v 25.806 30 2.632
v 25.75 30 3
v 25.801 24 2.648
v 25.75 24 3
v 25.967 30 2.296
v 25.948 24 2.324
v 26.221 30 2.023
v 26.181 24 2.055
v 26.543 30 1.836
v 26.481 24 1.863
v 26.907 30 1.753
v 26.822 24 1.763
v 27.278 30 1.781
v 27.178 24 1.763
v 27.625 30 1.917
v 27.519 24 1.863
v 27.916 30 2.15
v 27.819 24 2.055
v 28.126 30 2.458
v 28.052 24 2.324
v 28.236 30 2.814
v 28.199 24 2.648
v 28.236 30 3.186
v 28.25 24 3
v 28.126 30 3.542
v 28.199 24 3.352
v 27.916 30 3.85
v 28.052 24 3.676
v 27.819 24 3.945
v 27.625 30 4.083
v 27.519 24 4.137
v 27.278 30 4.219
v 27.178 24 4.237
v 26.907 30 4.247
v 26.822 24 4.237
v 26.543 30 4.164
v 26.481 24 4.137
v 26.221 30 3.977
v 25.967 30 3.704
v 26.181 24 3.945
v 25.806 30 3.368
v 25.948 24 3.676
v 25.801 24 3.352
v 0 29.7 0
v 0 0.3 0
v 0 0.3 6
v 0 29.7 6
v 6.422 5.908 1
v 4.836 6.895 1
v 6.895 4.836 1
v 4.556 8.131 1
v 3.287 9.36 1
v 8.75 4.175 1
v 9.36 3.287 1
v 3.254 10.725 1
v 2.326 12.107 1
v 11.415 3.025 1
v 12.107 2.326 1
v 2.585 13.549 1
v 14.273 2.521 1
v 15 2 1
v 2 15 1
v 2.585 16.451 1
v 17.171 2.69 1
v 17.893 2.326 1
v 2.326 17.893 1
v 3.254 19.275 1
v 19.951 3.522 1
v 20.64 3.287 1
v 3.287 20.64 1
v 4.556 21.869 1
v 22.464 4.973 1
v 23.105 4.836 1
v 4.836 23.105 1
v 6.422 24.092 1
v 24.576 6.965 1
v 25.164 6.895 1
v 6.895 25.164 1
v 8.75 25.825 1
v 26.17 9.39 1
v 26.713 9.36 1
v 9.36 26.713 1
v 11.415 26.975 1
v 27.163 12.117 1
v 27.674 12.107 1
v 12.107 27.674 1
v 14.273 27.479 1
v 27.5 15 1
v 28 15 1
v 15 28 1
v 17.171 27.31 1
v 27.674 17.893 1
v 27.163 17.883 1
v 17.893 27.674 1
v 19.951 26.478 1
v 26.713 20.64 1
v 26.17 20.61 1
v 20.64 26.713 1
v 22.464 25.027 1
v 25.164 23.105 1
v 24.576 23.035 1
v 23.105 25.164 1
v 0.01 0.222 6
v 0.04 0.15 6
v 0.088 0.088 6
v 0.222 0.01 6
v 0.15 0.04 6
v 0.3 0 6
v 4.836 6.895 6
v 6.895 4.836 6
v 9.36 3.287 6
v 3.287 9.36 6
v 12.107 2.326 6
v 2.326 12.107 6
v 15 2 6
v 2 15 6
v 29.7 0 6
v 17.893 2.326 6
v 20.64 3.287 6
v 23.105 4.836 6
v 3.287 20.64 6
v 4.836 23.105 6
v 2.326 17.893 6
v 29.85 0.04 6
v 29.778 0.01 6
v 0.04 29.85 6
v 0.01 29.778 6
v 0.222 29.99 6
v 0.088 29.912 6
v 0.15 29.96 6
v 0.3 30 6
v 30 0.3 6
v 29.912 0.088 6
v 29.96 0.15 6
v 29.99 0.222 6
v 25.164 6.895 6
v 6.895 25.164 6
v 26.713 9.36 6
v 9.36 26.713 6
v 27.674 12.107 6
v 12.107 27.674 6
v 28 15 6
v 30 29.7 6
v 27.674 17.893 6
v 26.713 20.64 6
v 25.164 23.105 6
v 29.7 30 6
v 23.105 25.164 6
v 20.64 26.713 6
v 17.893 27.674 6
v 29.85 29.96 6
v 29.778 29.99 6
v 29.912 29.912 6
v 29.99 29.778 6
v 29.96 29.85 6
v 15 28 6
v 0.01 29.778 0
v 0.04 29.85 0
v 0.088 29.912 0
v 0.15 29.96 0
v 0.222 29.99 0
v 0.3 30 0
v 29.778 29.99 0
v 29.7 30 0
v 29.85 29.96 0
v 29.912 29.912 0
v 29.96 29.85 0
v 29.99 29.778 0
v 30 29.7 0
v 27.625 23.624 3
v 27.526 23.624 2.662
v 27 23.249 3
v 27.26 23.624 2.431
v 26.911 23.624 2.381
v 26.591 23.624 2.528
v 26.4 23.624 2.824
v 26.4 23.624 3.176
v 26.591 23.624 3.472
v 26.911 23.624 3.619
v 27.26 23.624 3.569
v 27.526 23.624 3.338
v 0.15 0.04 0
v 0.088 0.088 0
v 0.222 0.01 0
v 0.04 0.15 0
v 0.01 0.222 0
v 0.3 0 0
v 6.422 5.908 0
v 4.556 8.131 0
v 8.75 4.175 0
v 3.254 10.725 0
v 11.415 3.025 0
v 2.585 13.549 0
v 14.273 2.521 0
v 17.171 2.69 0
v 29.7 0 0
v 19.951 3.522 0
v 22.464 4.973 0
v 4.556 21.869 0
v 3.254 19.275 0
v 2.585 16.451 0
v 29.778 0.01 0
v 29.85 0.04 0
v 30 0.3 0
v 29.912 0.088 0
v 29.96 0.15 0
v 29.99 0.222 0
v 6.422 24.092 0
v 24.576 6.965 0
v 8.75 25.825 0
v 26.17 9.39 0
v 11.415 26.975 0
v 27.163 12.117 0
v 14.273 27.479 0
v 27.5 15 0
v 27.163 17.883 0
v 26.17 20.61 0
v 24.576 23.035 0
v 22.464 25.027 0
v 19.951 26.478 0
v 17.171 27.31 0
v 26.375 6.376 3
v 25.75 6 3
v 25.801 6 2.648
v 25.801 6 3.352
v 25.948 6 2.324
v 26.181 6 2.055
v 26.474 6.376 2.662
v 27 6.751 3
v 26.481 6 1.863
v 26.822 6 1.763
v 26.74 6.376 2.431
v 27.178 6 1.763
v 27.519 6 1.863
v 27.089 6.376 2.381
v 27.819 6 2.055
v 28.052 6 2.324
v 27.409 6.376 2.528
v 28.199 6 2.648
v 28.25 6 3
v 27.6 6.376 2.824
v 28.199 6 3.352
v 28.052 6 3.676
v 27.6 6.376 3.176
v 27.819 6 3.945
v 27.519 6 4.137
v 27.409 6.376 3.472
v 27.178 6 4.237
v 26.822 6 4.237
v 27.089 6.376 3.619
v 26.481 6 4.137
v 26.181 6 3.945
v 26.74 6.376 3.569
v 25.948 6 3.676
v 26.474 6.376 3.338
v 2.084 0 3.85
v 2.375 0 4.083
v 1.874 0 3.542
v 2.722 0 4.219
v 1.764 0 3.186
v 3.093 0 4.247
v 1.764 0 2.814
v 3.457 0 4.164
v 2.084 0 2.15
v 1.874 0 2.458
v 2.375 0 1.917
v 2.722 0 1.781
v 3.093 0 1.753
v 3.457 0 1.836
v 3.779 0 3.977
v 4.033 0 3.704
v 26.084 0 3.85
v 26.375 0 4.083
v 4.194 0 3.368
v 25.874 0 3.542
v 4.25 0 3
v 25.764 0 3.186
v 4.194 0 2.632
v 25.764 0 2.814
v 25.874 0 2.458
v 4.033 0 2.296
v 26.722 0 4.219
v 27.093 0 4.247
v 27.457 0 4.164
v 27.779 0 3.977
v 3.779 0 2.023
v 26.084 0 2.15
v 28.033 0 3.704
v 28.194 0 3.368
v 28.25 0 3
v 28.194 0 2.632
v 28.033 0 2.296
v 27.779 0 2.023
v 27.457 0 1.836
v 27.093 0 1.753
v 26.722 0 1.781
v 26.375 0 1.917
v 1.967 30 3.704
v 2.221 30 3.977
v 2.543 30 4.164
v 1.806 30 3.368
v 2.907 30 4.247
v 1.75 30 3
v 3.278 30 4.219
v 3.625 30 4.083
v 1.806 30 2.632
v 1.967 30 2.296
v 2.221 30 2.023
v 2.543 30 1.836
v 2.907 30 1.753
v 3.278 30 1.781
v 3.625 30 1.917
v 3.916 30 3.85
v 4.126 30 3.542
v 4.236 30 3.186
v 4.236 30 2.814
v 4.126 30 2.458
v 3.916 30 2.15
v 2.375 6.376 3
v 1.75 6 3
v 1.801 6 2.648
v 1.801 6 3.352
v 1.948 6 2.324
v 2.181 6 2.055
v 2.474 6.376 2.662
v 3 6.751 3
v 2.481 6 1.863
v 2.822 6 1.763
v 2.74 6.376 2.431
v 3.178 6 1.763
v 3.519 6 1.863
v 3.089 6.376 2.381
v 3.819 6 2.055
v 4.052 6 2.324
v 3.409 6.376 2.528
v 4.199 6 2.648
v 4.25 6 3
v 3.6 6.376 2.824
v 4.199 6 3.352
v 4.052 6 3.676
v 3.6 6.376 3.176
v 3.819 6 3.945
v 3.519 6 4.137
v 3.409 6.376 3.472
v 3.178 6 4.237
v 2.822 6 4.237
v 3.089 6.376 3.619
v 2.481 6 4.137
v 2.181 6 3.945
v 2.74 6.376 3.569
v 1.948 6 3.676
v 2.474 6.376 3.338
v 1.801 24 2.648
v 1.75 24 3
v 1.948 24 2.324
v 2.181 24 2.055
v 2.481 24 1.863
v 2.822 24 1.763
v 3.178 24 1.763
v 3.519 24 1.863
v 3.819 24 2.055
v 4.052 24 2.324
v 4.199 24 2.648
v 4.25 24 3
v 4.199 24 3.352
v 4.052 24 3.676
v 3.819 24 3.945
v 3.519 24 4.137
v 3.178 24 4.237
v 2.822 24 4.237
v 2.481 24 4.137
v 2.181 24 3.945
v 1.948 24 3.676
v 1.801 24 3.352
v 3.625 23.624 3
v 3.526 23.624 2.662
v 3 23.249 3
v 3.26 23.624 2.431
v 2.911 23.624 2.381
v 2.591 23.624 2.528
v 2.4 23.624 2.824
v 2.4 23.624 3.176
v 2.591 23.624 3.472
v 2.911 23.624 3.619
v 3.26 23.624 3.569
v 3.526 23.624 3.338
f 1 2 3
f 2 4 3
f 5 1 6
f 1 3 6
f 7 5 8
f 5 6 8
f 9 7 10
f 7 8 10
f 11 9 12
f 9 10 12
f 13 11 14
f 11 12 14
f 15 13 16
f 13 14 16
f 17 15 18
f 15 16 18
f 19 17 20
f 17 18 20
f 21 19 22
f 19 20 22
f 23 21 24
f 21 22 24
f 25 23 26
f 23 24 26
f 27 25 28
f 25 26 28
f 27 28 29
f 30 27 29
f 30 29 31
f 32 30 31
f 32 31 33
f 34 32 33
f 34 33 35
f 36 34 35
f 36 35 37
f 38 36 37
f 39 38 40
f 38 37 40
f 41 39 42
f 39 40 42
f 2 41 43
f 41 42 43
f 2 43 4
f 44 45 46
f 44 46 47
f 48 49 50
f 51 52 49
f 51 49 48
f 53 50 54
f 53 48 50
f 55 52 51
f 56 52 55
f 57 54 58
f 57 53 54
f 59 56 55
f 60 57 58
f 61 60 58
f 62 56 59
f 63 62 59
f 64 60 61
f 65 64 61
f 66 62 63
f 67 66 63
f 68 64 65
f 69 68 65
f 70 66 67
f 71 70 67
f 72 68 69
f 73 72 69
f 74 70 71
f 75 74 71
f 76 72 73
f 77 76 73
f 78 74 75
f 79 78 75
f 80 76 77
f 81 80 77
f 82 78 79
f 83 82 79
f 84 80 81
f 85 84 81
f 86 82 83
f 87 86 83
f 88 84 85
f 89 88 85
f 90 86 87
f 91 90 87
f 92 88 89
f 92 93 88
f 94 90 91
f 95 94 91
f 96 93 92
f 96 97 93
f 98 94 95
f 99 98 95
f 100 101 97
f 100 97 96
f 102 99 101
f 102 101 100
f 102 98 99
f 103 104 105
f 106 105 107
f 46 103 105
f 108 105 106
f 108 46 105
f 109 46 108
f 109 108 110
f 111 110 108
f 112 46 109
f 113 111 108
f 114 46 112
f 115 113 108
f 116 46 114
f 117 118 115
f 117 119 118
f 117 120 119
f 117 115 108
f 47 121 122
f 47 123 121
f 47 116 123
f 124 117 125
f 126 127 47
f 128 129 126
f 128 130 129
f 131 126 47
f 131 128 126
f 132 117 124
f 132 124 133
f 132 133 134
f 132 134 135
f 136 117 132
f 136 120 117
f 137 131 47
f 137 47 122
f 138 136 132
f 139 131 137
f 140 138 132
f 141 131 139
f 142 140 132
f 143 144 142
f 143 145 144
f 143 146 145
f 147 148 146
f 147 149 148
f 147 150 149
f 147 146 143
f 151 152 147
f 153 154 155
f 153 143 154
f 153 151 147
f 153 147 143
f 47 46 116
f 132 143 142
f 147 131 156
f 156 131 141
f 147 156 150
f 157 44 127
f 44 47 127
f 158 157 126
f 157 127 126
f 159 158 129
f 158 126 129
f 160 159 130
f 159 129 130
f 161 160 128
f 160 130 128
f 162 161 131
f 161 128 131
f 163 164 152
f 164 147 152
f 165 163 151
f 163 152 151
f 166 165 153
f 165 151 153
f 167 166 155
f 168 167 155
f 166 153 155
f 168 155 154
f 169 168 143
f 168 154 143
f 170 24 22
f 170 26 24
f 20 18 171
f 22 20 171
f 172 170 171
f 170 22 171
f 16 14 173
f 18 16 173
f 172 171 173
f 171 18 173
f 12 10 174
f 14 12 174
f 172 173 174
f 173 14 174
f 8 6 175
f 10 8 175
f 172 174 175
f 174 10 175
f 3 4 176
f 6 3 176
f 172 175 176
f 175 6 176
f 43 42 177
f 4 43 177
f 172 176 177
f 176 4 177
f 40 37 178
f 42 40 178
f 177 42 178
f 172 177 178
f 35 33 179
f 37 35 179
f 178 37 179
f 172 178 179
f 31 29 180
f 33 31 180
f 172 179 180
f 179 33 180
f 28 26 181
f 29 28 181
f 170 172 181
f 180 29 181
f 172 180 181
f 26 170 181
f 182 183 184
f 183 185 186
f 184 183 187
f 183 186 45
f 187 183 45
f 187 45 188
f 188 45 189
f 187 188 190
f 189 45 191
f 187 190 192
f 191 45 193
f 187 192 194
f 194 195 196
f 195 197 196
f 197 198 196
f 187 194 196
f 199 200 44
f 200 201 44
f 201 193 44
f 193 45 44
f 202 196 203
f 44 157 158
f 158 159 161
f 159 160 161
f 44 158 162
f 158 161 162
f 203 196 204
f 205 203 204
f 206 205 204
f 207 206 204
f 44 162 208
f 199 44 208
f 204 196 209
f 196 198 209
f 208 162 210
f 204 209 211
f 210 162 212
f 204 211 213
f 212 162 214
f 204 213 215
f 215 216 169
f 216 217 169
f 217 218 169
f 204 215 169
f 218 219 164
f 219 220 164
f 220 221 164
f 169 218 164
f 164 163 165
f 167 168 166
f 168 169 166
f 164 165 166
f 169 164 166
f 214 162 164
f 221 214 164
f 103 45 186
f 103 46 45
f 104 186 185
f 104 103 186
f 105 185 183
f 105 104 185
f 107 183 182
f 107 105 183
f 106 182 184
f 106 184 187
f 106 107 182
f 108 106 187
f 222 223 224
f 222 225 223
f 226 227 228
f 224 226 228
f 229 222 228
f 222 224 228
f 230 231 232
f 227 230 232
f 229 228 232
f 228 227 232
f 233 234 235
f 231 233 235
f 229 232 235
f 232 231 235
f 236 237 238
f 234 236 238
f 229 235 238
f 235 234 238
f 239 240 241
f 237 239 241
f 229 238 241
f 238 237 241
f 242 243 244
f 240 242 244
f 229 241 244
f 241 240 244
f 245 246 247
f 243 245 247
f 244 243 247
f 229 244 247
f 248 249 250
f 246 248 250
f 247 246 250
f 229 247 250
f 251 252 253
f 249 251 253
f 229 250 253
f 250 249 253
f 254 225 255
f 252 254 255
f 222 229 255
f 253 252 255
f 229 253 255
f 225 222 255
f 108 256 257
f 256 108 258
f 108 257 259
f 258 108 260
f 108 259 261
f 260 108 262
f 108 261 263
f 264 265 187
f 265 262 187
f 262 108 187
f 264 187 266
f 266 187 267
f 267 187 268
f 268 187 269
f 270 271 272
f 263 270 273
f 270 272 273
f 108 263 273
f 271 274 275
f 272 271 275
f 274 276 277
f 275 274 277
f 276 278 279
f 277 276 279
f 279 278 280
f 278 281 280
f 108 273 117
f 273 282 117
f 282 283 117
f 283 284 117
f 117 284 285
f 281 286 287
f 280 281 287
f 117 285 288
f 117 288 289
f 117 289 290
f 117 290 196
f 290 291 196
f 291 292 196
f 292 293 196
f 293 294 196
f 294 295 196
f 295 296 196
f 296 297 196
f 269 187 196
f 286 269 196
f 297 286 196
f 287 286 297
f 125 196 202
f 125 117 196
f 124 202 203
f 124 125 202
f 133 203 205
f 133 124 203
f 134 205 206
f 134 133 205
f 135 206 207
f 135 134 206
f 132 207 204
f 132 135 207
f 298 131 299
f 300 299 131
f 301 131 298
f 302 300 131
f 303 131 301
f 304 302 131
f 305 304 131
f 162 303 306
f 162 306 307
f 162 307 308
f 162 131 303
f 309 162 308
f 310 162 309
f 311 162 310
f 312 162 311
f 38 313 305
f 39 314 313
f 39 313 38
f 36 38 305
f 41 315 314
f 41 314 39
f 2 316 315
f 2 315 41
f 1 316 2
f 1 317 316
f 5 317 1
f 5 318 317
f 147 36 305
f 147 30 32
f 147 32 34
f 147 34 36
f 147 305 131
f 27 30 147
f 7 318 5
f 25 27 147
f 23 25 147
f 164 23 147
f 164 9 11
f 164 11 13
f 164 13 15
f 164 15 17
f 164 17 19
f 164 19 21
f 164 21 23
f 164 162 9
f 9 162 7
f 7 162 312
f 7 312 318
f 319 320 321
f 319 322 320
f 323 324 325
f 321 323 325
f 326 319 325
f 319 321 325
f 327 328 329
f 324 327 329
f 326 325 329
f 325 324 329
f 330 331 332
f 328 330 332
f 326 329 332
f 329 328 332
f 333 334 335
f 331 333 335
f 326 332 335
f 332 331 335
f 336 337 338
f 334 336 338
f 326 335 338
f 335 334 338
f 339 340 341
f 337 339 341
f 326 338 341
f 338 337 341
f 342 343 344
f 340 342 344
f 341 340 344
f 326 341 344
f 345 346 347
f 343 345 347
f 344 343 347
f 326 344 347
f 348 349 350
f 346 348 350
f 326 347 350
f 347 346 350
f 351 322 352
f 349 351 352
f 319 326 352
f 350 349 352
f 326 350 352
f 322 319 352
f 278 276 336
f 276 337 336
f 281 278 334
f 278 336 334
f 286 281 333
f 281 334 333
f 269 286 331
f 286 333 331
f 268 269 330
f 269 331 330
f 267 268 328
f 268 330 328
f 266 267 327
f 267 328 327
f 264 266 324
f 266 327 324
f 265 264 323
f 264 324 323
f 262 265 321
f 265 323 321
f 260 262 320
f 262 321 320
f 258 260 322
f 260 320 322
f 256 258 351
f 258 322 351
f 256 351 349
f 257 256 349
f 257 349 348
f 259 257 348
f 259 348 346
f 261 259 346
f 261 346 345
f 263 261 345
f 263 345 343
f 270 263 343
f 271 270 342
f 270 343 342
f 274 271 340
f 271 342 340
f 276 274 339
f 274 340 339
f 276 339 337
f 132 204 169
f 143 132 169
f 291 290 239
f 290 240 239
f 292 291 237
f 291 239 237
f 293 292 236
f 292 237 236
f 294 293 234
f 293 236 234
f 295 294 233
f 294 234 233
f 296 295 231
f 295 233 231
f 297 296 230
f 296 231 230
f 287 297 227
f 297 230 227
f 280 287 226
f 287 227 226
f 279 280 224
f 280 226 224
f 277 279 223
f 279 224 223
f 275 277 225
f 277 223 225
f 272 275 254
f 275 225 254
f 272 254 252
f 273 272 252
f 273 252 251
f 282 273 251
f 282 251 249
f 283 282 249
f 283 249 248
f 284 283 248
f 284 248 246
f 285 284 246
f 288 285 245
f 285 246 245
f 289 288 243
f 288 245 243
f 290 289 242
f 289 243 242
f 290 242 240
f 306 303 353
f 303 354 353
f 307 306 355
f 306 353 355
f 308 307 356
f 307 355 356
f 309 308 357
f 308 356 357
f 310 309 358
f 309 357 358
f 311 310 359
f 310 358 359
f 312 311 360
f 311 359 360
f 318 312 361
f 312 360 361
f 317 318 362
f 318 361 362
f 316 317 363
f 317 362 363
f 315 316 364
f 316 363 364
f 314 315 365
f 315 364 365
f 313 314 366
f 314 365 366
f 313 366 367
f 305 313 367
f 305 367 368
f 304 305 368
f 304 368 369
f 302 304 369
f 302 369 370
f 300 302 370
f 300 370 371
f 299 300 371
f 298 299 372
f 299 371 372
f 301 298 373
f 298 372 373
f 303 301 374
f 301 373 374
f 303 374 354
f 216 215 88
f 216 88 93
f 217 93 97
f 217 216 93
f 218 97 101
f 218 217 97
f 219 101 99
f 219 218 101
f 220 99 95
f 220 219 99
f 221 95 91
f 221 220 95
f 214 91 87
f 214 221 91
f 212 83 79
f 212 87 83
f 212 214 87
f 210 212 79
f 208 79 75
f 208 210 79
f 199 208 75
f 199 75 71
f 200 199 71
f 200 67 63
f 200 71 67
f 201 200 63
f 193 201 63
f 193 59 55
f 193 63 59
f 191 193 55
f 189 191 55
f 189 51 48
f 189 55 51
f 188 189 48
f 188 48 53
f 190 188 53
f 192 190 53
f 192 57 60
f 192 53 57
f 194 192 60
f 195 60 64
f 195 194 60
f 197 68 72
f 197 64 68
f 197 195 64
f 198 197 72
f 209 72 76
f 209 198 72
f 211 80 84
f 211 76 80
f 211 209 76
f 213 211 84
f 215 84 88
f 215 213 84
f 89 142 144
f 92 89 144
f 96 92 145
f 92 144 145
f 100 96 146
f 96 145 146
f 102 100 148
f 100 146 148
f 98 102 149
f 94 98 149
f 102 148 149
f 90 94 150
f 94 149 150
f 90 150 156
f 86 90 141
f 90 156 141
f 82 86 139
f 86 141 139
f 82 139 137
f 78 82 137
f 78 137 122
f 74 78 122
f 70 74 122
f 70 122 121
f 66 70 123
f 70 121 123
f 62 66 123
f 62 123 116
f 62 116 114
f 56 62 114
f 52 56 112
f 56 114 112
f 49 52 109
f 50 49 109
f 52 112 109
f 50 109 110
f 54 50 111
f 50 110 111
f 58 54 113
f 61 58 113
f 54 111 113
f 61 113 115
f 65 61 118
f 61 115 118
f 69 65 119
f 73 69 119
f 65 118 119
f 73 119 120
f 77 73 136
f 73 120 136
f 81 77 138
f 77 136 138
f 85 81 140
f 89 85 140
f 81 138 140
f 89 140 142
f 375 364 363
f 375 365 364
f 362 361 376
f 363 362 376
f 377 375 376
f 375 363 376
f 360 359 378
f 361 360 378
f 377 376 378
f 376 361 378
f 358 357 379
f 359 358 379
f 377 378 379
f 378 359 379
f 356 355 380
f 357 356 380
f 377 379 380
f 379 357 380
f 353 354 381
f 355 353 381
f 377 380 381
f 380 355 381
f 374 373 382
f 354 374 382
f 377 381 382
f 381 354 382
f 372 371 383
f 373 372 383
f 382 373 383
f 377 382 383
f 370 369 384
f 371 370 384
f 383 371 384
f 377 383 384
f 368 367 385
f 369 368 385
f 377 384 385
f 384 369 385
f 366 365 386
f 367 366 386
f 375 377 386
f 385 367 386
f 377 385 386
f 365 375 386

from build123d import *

# Parameters (mm, degrees)
ESQUISSE1_W                                   = 30
ESQUISSE1_H                                   = 30
ESQUISSE1_R                                   = 12.5
BOSS_EXTRU_1_DEPTH                            = 6
ESQUISSE3_R                                   = 13
ENL_V_MAT_EXTRU_1_DEPTH                       = 5
TROU_POUR_TARAUDAGE_POUR_TROU_TARAUD_M3_D     = 2.5
TROU_POUR_TARAUDAGE_POUR_TROU_TARAUD_M3_DEPTH = 6
TROU_POUR_TARAUDAGE_POUR_TROU_TARAUD_M3_TIP   = 0.751075774
TROU_POUR_TARAUDAGE_POUR_TROU_TARAUD_2_D      = 2.5
TROU_POUR_TARAUDAGE_POUR_TROU_TARAUD_2_DEPTH  = 6
TROU_POUR_TARAUDAGE_POUR_TROU_TARAUD_2_TIP    = 0.751075774
CONG_1_R                                      = 0.3


with BuildPart() as part:
    # Esquisse1 → Boss.-Extru.1 (new body)
    with BuildSketch(Plane.XY):
        with Locations((15, 15)):
            Rectangle(ESQUISSE1_W, ESQUISSE1_H)
        with Locations((15, 15)):
            Circle(ESQUISSE1_R, mode=Mode.SUBTRACT)
    extrude(amount=BOSS_EXTRU_1_DEPTH)

    # Esquisse3 → Enlèv. mat.-Extru.1 (cut)
    with BuildSketch(Plane.XY.offset(6)):
        with Locations((15, 15)):
            Circle(ESQUISSE3_R)
    extrude(amount=-ENL_V_MAT_EXTRU_1_DEPTH, mode=Mode.SUBTRACT)

    # Trou pour taraudage pour trou taraud_ M3
    with Locations(Plane(origin=(0, 30, 0), x_dir=(1, 0, 0), z_dir=(0, 1, 0))):
        with Locations((3, -3), (27, -3)):
            Hole(TROU_POUR_TARAUDAGE_POUR_TROU_TARAUD_M3_D / 2, depth=TROU_POUR_TARAUDAGE_POUR_TROU_TARAUD_M3_DEPTH)
            with Locations((0, 0, -(TROU_POUR_TARAUDAGE_POUR_TROU_TARAUD_M3_DEPTH + TROU_POUR_TARAUDAGE_POUR_TROU_TARAUD_M3_TIP / 2))):  # 118° drill point
                Cone(0, TROU_POUR_TARAUDAGE_POUR_TROU_TARAUD_M3_D / 2, TROU_POUR_TARAUDAGE_POUR_TROU_TARAUD_M3_TIP, mode=Mode.SUBTRACT)

    # Trou pour taraudage pour trou taraud 2
    with Locations(Plane(origin=(0, 0, 0), x_dir=(-1, 0, 0), z_dir=(0, -1, 0))):
        with Locations((-3, -3), (-27, -3)):
            Hole(TROU_POUR_TARAUDAGE_POUR_TROU_TARAUD_2_D / 2, depth=TROU_POUR_TARAUDAGE_POUR_TROU_TARAUD_2_DEPTH)
            with Locations((0, 0, -(TROU_POUR_TARAUDAGE_POUR_TROU_TARAUD_2_DEPTH + TROU_POUR_TARAUDAGE_POUR_TROU_TARAUD_2_TIP / 2))):  # 118° drill point
                Cone(0, TROU_POUR_TARAUDAGE_POUR_TROU_TARAUD_2_D / 2, TROU_POUR_TARAUDAGE_POUR_TROU_TARAUD_2_TIP, mode=Mode.SUBTRACT)

    # Congé1
    cong_1_edges = [part.edges().sort_by_distance(p)[0] for p in [
        (0, 30, 3),
        (30, 30, 3),
        (30, 0, 3),
        (0, 0, 3),
    ]]
    fillet(cong_1_edges, radius=CONG_1_R)


solid = part.part
